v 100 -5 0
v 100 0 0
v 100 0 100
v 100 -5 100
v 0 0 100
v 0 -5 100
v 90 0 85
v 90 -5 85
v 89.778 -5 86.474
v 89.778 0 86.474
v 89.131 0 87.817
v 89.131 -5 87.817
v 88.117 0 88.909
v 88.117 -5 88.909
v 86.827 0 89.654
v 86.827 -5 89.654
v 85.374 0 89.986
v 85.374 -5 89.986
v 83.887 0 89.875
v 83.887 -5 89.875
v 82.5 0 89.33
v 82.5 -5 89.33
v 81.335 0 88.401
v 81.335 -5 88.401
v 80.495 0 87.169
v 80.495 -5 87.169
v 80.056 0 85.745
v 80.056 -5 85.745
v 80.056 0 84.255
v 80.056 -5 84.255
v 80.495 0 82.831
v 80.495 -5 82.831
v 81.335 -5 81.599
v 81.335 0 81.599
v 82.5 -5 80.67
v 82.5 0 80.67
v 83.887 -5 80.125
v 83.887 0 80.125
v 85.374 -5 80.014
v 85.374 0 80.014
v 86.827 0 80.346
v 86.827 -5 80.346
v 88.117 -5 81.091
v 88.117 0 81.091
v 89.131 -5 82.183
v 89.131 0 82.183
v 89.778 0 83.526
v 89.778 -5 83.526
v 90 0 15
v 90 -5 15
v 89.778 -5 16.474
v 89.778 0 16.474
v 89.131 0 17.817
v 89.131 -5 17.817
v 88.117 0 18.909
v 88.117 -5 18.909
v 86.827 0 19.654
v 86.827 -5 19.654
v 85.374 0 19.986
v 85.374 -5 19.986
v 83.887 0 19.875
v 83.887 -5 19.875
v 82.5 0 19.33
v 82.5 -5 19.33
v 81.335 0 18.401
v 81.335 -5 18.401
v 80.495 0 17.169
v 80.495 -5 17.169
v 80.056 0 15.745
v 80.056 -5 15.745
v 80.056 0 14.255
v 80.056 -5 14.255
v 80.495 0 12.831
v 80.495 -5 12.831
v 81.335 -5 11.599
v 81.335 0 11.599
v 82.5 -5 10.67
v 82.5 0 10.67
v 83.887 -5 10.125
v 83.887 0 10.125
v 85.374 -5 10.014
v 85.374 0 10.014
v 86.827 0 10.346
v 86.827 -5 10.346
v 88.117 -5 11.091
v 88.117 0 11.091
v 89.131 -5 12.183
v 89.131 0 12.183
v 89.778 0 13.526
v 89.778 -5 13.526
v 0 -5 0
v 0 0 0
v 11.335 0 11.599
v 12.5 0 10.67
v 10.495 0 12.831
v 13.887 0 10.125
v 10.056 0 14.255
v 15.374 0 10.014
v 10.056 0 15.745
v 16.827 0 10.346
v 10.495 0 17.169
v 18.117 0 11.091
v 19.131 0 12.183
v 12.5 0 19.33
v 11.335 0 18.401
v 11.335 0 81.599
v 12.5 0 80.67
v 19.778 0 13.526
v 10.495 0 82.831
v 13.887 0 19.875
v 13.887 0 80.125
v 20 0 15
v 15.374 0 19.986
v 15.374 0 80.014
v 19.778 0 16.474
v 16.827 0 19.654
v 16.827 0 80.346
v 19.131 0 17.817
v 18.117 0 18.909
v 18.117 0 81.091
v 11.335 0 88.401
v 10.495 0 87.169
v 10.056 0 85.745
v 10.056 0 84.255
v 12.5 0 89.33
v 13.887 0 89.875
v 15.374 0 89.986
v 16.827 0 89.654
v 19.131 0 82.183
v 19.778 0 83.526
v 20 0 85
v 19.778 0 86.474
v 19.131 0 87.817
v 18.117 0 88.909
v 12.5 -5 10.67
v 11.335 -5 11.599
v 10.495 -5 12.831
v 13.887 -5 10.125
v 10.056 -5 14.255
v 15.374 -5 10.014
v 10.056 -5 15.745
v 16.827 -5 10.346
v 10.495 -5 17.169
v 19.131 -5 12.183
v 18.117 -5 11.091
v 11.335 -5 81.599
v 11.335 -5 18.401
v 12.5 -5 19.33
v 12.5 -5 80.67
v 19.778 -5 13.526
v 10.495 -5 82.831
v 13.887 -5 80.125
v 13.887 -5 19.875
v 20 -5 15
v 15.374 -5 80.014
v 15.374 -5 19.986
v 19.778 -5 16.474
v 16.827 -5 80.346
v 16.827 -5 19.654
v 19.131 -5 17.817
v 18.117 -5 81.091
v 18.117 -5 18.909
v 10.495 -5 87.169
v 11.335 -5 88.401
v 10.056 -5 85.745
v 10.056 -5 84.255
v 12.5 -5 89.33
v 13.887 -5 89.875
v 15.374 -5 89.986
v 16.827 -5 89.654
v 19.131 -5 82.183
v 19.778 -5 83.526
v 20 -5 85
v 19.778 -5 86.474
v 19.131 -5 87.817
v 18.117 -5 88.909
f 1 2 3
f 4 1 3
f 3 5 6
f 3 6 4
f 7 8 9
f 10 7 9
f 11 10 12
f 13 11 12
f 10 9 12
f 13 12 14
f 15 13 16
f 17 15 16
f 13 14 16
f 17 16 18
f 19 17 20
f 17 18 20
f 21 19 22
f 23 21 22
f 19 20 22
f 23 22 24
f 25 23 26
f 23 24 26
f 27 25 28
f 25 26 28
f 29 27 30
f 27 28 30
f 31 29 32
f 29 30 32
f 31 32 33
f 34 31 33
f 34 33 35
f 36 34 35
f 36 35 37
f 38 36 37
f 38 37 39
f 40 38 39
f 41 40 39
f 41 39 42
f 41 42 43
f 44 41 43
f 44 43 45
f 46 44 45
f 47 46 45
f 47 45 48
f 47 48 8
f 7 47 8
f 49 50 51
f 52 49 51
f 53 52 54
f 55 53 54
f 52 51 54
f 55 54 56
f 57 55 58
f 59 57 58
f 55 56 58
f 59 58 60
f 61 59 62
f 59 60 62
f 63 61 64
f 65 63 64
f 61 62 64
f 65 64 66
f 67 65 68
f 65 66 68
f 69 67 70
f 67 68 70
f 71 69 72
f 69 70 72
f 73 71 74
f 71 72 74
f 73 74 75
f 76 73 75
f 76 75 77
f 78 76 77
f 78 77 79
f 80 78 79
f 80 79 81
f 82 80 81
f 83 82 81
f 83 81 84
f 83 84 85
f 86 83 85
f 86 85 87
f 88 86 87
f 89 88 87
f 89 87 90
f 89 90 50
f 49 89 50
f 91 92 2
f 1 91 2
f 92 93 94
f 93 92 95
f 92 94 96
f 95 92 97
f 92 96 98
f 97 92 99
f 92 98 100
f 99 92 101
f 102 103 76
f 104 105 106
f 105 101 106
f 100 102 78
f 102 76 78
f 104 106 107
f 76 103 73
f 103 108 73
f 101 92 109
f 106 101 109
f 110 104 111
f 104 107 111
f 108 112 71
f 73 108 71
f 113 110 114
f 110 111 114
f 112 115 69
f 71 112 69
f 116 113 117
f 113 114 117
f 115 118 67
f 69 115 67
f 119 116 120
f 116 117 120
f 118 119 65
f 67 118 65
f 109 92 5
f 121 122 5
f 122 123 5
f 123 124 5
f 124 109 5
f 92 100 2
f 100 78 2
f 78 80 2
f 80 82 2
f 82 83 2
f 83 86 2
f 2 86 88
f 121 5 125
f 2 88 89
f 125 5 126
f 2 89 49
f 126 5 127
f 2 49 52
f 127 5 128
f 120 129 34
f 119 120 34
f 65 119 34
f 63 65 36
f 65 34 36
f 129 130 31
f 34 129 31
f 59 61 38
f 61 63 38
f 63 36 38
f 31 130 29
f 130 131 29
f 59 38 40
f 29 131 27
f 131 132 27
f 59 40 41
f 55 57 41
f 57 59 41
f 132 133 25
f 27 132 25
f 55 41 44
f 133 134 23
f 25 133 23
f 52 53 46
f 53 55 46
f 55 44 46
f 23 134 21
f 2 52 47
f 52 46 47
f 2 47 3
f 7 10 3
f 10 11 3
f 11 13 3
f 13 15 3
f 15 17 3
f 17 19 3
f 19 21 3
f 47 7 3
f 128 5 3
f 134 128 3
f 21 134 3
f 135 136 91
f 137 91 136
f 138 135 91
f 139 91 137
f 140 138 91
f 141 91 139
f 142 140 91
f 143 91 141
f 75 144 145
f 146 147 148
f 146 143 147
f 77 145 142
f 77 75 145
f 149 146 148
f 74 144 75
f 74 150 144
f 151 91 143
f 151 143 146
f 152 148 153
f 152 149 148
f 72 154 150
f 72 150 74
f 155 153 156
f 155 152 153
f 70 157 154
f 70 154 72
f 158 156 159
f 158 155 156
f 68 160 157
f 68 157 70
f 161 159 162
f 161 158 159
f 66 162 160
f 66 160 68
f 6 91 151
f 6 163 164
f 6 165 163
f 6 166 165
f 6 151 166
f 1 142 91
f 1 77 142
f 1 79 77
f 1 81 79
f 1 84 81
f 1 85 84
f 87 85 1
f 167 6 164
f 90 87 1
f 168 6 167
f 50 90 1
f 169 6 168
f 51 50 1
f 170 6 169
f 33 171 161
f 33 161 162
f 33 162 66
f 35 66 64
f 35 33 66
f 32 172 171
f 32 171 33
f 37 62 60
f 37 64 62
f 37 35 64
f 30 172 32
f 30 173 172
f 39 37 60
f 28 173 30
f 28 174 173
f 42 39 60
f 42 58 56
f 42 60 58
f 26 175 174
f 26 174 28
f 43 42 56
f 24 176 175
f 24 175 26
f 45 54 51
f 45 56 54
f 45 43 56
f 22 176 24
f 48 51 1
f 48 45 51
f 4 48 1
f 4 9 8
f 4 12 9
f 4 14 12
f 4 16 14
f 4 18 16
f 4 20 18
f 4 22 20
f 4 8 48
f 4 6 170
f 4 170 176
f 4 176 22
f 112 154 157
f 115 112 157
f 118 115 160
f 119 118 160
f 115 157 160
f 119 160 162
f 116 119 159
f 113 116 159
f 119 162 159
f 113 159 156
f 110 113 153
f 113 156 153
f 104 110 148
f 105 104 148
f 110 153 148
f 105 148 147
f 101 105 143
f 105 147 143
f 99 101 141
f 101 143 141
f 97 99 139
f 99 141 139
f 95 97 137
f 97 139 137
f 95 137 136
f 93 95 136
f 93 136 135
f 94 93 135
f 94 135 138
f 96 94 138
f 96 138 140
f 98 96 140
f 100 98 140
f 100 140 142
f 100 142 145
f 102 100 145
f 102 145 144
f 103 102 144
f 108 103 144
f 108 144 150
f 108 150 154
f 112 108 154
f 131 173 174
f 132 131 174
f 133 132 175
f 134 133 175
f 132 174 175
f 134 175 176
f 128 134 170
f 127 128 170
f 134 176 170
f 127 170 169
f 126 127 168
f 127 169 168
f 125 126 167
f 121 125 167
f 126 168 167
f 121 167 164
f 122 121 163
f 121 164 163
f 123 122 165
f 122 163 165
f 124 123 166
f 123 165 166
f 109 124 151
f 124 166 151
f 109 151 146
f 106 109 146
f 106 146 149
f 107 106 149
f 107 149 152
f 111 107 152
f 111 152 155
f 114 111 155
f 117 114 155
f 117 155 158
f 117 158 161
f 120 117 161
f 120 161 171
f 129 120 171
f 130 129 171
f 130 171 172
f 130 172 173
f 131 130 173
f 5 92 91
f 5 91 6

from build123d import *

# Parameters (mm, degrees)
F0_W     = 100
F0_H     = 100
F1_DEPTH = 5
F2_R     = 5
F3_DEPTH = 5.001


with BuildPart() as f1:
    # F0 (on Front) → F1 (new body)
    with BuildSketch(Plane.XZ):
        with Locations((50, 50)):
            Rectangle(F0_W, F0_H)
    extrude(amount=F1_DEPTH)

    # F2 (on face) → F3 (cut, through all)
    with BuildSketch(Plane.XZ.offset(5)):
        with Locations((15, 85)):
            Circle(F2_R)
        with Locations((85, 85)):
            Circle(F2_R)
        with Locations((15, 15)):
            Circle(F2_R)
        with Locations((85, 15)):
            Circle(F2_R)
    extrude(amount=-F3_DEPTH, mode=Mode.SUBTRACT)


solid = f1.part
